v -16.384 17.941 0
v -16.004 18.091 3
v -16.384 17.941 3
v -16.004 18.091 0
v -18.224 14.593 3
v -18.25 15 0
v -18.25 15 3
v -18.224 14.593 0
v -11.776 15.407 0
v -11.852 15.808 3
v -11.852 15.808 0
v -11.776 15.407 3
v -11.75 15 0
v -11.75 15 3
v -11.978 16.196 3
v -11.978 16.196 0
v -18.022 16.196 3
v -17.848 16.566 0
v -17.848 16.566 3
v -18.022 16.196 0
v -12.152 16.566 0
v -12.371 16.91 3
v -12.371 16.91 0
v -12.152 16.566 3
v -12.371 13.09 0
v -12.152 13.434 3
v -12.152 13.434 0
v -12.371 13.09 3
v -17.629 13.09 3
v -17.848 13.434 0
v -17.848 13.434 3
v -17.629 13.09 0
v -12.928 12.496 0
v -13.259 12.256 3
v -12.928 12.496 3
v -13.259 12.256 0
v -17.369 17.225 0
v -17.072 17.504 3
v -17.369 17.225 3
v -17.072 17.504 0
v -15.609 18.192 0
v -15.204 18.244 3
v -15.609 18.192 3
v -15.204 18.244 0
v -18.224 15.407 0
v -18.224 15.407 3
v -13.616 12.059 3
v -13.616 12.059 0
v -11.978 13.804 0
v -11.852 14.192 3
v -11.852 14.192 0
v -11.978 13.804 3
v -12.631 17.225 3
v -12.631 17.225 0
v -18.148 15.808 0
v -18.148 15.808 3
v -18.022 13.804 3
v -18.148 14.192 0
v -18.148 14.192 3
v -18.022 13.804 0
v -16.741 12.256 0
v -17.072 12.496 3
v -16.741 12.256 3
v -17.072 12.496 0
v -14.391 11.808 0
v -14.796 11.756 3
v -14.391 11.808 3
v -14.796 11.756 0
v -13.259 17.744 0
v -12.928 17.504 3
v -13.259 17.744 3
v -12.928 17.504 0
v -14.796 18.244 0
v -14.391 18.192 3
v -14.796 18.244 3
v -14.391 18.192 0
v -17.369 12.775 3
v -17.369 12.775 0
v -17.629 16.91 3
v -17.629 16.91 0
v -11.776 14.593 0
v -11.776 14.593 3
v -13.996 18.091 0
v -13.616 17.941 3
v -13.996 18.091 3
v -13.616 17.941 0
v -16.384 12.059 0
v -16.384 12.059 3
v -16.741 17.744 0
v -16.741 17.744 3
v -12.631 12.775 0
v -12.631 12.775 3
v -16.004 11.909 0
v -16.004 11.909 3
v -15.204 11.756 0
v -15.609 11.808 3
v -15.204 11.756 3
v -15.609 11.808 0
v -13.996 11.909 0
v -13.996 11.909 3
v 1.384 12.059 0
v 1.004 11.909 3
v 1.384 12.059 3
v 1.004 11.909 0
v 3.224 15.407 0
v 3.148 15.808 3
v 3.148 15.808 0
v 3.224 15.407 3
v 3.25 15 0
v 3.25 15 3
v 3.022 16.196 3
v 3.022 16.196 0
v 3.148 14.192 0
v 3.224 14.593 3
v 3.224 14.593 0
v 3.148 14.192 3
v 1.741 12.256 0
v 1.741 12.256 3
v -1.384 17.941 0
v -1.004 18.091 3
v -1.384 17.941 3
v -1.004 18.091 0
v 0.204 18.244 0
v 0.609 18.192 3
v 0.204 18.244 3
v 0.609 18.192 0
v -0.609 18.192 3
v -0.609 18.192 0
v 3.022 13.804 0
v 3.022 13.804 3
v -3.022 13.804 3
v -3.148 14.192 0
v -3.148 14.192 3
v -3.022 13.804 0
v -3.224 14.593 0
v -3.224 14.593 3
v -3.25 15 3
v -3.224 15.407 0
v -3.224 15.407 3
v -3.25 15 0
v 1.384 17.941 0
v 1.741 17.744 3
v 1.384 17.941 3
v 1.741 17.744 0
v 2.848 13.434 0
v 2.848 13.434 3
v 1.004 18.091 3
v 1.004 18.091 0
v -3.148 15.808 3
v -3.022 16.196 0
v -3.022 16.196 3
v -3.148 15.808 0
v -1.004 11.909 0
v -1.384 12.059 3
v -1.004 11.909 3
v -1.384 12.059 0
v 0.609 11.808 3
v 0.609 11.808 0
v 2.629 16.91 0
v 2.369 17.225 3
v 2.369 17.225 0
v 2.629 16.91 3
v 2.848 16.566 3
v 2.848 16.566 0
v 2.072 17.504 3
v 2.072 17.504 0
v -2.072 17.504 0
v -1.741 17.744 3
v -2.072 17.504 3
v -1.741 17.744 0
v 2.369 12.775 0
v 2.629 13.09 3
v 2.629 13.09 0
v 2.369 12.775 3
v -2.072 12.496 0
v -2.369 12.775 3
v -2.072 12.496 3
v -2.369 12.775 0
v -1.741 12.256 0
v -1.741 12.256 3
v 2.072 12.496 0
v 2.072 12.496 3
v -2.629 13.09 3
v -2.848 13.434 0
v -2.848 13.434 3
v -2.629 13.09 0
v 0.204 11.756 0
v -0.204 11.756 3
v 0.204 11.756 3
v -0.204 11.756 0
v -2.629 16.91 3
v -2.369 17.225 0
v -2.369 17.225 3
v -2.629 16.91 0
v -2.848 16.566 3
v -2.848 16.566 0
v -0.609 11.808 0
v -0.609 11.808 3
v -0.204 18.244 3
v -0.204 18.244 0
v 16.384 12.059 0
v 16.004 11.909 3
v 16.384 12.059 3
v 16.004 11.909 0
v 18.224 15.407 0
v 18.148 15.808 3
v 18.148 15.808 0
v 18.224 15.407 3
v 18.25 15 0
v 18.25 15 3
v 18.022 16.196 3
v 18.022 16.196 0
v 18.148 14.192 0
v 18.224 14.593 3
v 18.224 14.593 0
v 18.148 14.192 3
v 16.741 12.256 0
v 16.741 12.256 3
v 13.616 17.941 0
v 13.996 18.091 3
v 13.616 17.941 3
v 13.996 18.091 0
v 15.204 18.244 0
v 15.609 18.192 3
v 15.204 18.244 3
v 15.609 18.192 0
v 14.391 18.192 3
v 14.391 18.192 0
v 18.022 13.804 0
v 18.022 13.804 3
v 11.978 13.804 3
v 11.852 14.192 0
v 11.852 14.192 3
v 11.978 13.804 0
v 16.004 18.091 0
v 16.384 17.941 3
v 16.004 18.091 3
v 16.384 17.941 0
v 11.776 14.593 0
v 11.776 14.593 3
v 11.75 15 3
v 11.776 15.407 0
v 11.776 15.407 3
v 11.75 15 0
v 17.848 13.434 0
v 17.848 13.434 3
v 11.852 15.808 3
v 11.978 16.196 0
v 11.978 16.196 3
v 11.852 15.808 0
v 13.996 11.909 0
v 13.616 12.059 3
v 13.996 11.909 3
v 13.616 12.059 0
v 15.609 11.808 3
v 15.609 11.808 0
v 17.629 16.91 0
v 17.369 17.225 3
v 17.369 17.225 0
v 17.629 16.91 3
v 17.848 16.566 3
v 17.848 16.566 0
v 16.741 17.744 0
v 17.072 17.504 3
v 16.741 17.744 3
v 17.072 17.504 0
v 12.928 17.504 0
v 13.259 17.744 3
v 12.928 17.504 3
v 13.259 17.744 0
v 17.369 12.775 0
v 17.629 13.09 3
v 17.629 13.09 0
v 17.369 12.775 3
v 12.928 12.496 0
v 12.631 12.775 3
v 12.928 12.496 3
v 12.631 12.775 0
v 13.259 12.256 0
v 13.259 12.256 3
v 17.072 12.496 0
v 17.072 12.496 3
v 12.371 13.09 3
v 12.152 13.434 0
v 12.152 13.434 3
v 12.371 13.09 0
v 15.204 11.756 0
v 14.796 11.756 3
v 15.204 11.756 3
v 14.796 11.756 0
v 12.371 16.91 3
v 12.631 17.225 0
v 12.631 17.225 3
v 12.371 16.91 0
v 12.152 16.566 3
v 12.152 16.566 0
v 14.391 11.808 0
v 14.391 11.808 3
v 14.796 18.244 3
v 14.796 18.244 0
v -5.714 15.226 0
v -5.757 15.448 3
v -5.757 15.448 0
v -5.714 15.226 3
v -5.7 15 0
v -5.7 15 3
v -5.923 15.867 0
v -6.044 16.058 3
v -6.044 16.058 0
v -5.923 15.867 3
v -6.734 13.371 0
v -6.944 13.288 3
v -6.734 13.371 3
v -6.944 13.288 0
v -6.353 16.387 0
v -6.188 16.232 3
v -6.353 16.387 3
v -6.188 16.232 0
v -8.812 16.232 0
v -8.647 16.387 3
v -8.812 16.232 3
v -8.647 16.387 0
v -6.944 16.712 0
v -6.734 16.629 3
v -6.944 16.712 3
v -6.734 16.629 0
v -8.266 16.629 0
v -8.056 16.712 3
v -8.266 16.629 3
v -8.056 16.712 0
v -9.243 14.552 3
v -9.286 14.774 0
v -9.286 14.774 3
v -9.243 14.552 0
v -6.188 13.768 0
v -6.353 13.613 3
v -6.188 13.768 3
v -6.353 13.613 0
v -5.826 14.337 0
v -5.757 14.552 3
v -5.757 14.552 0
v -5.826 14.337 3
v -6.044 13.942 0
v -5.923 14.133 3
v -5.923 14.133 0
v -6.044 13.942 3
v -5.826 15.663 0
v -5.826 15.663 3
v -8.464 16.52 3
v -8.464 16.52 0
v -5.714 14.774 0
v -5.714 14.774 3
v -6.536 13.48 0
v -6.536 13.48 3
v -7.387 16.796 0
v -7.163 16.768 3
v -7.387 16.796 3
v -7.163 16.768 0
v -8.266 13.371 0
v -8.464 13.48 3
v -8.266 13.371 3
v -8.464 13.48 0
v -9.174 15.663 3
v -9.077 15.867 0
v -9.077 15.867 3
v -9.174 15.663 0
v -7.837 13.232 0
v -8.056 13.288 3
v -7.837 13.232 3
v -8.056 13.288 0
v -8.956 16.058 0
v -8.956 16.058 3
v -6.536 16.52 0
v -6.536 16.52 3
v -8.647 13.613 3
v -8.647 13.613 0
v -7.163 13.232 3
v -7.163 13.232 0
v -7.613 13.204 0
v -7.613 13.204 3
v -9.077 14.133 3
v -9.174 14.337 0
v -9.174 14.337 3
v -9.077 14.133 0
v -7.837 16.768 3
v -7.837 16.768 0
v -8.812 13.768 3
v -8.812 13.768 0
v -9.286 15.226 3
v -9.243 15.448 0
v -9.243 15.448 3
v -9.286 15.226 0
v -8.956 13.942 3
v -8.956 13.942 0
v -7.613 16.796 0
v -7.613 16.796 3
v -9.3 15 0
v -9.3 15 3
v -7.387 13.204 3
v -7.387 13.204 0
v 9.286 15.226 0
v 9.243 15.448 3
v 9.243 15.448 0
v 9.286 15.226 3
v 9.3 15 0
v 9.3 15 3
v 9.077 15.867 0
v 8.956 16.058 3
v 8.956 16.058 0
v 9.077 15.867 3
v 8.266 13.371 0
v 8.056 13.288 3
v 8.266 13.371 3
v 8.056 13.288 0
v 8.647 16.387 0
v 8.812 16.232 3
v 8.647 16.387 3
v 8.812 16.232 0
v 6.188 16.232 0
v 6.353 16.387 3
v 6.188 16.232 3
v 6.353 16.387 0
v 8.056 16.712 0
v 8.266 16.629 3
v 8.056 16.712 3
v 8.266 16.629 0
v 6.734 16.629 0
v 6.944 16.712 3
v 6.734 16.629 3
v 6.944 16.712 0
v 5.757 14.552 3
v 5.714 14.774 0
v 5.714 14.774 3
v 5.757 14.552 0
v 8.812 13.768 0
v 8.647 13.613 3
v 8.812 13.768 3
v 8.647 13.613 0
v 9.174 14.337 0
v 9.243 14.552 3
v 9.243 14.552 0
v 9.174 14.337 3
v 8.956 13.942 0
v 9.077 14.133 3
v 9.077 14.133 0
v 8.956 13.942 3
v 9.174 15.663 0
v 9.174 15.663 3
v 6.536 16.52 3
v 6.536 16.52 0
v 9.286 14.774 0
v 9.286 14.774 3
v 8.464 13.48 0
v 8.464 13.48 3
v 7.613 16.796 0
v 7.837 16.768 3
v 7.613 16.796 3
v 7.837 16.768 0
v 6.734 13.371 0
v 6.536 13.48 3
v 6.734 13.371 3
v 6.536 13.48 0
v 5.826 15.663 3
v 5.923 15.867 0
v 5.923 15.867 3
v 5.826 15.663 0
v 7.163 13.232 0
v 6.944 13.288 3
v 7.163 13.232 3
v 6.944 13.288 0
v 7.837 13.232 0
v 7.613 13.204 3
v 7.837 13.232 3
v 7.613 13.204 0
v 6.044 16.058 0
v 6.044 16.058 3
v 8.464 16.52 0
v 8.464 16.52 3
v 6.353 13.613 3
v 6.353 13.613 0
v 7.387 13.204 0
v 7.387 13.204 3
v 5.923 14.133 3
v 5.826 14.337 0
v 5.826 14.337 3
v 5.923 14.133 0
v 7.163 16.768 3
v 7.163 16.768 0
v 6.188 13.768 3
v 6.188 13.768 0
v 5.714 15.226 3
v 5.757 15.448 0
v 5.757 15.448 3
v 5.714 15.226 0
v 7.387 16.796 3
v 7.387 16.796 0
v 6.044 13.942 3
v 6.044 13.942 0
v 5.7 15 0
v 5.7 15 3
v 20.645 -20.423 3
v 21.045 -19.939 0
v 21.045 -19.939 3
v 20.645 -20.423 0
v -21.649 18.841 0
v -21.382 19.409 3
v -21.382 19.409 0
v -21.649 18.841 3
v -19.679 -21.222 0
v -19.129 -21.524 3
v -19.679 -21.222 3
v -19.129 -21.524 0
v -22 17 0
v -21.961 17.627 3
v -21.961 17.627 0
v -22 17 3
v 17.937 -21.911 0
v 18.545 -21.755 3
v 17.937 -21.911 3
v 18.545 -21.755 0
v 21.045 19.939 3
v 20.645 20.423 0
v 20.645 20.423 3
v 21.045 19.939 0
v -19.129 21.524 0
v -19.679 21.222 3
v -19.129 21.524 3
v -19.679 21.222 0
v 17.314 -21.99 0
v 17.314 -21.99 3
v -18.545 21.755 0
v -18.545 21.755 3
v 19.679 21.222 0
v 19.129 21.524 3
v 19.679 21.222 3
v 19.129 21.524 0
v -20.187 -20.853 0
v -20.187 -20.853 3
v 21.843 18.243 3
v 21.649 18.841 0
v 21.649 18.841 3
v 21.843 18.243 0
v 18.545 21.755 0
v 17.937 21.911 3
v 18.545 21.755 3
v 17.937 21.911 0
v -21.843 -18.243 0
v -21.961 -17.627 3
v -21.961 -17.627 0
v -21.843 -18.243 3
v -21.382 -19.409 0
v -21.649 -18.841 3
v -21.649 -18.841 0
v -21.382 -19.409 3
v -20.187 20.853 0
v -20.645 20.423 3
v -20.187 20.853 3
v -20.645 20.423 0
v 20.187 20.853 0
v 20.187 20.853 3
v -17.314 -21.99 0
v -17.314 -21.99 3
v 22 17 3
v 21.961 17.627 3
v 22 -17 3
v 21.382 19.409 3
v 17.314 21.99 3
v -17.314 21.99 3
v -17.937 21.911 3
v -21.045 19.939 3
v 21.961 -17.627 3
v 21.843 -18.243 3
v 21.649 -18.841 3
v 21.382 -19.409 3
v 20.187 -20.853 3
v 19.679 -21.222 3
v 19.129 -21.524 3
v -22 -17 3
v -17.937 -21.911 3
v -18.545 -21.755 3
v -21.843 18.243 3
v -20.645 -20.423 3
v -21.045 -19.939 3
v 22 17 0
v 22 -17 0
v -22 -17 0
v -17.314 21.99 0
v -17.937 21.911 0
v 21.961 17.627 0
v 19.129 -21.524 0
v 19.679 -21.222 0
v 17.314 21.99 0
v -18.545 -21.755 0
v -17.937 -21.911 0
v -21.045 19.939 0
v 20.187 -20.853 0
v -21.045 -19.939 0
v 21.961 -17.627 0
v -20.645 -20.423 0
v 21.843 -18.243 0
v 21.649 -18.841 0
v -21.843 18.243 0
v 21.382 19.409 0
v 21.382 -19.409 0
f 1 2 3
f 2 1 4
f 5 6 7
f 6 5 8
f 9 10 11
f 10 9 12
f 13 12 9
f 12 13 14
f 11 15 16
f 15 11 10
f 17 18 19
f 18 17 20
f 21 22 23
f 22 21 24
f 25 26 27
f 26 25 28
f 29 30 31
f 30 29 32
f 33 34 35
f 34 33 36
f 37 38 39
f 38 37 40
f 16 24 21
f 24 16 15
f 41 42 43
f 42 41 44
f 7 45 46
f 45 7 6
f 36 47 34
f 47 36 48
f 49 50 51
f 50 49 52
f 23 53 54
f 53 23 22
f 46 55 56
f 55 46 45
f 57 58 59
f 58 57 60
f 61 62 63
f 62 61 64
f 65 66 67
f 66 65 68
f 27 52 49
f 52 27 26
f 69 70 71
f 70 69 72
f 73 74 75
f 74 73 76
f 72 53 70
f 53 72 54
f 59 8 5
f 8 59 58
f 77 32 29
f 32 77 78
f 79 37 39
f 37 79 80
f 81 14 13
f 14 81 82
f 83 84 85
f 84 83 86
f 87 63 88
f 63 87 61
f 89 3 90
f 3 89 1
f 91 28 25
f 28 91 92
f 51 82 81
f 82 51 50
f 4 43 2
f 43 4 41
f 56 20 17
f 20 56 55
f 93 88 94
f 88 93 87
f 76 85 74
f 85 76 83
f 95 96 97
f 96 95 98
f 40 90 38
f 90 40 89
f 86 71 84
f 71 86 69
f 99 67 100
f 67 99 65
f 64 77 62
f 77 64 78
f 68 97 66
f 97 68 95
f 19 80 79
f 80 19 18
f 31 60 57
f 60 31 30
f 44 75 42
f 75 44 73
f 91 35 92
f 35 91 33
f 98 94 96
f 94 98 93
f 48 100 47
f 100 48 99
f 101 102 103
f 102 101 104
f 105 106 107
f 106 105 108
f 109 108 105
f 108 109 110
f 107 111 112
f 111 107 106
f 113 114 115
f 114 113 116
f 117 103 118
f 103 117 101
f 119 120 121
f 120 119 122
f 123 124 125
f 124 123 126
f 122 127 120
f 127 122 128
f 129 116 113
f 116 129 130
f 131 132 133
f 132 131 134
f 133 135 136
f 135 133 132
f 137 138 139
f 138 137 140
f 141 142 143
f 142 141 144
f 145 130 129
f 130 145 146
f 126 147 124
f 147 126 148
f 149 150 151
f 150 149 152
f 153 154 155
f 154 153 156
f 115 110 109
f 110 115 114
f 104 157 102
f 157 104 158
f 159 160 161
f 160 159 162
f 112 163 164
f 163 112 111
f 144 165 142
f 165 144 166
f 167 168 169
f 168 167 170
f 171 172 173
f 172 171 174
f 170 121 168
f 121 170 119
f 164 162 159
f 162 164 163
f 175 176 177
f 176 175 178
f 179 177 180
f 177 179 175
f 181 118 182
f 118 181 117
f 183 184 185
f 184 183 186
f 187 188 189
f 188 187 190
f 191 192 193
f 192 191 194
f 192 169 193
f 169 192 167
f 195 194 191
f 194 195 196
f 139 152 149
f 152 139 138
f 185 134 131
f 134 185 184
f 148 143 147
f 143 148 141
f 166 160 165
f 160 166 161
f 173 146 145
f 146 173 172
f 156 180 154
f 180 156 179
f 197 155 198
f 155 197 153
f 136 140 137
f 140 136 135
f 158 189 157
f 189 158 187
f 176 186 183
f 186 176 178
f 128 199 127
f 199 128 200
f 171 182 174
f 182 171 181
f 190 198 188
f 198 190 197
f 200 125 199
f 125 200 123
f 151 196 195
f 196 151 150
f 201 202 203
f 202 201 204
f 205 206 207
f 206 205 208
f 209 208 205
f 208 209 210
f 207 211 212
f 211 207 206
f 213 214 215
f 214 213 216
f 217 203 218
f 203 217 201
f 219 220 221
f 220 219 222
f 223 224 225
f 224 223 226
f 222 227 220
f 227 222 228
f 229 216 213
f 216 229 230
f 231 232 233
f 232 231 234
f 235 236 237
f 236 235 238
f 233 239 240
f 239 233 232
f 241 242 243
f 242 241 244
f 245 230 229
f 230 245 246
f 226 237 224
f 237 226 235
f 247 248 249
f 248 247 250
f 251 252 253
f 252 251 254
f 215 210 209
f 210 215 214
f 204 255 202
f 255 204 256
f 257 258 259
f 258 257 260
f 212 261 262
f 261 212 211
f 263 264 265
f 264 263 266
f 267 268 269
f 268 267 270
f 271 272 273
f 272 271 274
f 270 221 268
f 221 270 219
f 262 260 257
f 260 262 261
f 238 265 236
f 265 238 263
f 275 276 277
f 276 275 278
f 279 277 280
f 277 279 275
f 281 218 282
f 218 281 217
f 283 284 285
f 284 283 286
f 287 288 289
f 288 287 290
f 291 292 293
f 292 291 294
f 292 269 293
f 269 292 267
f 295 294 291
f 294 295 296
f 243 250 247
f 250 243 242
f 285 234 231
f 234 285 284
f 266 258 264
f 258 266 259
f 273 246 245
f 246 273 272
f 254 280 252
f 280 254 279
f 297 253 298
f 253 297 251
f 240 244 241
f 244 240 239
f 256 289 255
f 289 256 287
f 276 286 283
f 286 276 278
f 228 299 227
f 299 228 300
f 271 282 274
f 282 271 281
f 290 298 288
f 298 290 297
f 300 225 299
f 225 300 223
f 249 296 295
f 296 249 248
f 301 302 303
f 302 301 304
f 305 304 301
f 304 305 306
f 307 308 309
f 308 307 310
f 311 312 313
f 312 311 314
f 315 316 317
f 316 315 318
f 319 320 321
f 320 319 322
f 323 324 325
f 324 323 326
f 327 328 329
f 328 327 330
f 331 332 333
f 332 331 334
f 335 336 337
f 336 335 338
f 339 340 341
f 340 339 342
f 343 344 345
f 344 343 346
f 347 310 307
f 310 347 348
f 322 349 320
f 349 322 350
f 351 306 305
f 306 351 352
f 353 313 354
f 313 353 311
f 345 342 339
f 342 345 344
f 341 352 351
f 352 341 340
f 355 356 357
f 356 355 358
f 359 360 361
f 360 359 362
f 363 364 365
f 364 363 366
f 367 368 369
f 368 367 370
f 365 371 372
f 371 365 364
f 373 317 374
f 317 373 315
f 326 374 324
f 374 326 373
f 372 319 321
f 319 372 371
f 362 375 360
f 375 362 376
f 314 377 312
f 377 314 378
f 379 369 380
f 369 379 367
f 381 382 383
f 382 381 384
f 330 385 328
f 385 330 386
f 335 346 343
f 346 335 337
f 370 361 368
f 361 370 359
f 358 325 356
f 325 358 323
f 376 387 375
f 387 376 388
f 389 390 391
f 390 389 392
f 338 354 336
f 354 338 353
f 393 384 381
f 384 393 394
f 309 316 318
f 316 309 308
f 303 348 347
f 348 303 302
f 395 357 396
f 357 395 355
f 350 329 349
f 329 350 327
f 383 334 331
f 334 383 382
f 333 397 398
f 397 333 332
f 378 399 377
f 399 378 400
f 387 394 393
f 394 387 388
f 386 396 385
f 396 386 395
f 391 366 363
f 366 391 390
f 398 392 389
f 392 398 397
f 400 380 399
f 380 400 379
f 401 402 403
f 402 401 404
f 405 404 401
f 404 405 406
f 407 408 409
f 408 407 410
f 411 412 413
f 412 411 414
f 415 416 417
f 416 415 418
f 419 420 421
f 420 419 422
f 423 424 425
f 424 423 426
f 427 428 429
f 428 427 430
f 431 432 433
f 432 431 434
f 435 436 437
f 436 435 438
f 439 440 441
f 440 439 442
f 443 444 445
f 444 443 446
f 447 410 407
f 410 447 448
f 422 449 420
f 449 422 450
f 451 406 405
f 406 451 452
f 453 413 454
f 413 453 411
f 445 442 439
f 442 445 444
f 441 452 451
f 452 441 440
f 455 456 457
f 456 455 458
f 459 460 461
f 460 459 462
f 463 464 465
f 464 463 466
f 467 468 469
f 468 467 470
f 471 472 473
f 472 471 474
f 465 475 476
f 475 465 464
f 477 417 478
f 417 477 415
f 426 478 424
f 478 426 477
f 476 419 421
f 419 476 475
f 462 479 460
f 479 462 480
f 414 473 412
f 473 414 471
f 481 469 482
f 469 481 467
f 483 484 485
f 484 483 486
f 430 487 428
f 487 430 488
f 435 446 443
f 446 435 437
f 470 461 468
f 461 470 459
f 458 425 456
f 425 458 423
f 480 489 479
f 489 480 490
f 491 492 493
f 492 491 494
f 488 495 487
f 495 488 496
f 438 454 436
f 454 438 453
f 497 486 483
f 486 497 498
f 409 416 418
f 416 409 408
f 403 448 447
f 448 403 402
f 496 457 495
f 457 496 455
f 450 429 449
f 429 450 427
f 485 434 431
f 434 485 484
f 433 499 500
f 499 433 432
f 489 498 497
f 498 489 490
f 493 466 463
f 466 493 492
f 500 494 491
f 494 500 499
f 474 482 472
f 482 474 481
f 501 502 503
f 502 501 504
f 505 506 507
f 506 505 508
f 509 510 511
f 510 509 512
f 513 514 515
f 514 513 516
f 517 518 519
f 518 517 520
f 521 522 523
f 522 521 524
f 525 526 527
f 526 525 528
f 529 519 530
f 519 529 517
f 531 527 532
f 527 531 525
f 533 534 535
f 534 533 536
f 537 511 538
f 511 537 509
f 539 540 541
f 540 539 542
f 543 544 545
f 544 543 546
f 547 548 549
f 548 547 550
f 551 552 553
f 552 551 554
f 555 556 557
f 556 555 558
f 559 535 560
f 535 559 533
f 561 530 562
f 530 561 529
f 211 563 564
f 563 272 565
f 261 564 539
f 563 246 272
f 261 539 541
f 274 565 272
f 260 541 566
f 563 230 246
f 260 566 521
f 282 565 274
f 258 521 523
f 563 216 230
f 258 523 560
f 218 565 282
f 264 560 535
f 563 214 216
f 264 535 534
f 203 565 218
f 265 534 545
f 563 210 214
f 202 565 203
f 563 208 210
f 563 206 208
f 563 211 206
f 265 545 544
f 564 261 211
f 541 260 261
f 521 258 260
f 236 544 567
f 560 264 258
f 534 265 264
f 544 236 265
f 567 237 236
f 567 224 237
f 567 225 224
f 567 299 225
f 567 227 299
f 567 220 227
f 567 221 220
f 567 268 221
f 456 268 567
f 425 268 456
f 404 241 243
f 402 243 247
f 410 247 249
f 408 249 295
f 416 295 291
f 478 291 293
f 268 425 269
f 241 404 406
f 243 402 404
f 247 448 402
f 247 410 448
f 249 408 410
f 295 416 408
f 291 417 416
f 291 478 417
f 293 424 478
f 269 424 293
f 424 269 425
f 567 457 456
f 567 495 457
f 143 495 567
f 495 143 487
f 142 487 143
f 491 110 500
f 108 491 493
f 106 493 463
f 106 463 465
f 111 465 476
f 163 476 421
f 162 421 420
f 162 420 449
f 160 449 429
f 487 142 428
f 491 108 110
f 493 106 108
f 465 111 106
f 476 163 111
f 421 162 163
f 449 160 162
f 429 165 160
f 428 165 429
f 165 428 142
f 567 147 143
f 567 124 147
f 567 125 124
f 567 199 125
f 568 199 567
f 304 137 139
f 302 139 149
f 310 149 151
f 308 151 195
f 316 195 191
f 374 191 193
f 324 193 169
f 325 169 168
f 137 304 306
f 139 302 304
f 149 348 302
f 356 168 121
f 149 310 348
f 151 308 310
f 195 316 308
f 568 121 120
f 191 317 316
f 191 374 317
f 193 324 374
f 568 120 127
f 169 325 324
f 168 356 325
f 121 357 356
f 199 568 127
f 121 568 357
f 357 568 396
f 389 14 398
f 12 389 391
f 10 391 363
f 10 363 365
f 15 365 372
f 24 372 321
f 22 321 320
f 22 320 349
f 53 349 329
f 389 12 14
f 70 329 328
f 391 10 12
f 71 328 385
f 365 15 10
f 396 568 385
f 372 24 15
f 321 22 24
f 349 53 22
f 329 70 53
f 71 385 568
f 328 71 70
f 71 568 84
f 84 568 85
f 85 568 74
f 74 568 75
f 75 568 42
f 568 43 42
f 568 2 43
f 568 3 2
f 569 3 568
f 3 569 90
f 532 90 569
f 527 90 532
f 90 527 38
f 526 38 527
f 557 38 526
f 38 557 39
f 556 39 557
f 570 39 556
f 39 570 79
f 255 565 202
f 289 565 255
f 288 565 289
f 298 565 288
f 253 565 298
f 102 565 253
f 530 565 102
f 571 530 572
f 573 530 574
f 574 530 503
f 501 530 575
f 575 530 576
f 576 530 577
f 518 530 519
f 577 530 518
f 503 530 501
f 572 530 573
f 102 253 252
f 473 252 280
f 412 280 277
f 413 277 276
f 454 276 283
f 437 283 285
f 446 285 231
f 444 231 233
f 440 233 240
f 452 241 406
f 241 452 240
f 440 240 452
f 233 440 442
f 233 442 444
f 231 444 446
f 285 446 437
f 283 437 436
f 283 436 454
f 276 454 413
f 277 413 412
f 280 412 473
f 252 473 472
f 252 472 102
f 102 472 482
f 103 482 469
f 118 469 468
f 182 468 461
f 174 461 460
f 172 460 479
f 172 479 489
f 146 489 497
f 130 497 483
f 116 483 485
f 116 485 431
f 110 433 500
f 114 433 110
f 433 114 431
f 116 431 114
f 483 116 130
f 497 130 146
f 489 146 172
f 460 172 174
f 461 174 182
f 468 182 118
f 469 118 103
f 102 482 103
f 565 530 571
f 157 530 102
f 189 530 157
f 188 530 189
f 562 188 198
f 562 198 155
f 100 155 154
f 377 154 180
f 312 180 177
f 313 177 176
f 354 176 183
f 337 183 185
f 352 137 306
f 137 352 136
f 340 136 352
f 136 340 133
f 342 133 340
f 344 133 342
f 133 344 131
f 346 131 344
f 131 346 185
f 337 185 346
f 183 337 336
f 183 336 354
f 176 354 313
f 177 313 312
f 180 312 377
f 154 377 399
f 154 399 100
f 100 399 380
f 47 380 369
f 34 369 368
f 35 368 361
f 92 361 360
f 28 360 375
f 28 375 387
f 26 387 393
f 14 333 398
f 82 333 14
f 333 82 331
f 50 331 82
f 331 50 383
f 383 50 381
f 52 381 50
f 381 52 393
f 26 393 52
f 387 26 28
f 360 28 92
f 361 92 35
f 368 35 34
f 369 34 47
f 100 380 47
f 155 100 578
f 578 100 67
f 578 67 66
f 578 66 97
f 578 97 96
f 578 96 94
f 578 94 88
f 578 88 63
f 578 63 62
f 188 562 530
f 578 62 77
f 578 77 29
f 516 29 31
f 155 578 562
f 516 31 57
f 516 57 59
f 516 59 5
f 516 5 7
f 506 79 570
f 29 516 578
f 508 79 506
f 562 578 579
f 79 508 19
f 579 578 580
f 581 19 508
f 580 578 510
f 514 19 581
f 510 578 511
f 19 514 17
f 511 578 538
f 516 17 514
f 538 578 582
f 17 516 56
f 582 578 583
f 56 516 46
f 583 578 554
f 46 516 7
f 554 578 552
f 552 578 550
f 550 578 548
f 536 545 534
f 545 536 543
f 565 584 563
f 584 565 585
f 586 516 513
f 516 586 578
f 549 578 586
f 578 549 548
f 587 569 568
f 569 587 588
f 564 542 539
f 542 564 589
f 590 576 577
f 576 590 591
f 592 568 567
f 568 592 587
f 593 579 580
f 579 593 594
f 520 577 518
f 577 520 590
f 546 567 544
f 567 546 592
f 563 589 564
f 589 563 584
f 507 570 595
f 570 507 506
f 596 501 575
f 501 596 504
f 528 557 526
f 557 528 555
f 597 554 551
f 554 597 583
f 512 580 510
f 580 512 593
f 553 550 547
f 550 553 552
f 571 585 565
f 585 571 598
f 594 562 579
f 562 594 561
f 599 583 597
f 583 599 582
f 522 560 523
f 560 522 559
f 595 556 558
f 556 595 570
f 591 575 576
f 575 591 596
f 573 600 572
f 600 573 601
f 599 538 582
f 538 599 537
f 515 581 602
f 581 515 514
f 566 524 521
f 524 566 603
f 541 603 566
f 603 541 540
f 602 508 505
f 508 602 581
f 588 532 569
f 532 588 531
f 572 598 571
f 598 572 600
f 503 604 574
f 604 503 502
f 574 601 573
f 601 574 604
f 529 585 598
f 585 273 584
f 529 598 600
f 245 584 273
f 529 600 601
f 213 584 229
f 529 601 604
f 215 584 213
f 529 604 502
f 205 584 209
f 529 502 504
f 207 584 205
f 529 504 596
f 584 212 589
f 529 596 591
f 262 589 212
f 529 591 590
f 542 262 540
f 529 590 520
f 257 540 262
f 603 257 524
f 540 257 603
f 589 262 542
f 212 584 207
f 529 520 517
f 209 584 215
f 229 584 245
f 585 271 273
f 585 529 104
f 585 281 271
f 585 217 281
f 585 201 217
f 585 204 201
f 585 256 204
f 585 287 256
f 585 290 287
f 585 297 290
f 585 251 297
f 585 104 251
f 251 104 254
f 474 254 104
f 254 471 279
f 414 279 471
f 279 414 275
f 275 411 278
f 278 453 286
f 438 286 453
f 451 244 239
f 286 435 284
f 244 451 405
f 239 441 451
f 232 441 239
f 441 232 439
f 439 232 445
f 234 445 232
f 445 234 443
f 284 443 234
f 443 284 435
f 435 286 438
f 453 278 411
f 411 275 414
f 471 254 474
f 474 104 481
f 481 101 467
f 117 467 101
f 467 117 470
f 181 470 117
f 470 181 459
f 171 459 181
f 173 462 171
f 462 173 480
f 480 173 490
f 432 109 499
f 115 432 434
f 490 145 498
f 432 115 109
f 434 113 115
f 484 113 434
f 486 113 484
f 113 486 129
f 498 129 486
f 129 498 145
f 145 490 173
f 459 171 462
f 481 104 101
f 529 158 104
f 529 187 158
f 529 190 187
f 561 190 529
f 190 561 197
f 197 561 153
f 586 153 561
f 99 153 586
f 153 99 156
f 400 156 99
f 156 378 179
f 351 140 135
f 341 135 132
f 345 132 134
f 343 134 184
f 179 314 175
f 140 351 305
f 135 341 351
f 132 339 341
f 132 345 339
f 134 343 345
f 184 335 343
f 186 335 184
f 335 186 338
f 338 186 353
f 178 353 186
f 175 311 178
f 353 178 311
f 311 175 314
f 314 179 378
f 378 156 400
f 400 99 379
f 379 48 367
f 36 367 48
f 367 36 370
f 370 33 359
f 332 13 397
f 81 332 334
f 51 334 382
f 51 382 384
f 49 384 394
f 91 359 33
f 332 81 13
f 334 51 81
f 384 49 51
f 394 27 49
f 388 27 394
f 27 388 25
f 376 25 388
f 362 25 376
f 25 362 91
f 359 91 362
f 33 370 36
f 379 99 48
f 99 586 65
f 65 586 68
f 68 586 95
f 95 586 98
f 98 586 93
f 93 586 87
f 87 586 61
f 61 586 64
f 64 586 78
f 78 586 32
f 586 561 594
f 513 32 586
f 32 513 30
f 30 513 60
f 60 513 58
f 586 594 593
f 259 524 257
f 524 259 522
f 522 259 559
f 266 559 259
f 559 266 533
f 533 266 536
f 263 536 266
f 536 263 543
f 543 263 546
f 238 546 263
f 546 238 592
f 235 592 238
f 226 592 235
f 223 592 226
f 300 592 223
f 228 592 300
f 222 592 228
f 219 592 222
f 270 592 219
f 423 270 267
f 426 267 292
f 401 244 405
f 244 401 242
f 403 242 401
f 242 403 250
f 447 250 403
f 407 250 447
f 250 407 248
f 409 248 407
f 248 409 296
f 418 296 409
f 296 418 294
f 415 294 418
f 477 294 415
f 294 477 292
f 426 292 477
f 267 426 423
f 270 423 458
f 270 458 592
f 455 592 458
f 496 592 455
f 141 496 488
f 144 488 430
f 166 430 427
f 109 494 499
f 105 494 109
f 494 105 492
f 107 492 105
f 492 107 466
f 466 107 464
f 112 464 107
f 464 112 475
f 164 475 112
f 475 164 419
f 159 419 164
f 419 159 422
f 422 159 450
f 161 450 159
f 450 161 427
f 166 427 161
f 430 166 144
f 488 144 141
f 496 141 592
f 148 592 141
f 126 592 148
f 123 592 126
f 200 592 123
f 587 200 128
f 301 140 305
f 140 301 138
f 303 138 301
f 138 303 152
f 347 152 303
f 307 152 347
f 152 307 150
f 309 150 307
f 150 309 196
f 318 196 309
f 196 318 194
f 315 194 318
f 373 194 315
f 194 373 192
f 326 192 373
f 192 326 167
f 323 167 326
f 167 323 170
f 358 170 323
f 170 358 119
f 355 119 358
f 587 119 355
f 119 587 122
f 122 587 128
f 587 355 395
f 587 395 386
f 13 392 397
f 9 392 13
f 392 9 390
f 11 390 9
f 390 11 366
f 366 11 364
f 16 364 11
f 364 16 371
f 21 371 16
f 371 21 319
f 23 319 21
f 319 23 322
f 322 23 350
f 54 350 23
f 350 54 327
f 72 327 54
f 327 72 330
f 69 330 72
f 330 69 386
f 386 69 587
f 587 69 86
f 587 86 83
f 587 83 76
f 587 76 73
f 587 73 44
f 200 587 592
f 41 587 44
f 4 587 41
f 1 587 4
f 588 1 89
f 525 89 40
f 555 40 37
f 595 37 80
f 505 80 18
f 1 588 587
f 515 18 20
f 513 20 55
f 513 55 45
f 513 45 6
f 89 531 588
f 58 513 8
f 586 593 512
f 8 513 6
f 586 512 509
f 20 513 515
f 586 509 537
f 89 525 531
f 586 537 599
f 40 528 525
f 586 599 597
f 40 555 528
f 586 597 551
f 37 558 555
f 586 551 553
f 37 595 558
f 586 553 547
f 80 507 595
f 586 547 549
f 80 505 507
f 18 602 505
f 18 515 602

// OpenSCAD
$fn = 50;


difference() {
	union() {
		*color(alpha = 1.0000000000, c = "gray") {
			translate(v = [0, 7, 0]) {
				linear_extrude(height = 1) {
					text(font = "Arial:style=Bold", halign = "center", size = 4.5000000000, text = "COMMENT plate main", valign = "center");
				}
			}
		}
		hull() {
			translate(v = [-17.0000000000, 17.0000000000, 0]) {
				cylinder(h = 3, r = 5);
			}
			translate(v = [17.0000000000, 17.0000000000, 0]) {
				cylinder(h = 3, r = 5);
			}
			translate(v = [-17.0000000000, -17.0000000000, 0]) {
				cylinder(h = 3, r = 5);
			}
			translate(v = [17.0000000000, -17.0000000000, 0]) {
				cylinder(h = 3, r = 5);
			}
		}
	}
	union() {
		*color(alpha = 1.0000000000, c = "gray") {
			translate(v = [0, 7, 0]) {
				linear_extrude(height = 1) {
					text(font = "Arial:style=Bold", halign = "center", size = 4.5000000000, text = "COMMENT holes main", valign = "center");
				}
			}
		}
		translate(v = [-15.0000000000, 15.0000000000, -100.0000000000]) {
			cylinder(h = 200, r = 3.2500000000);
		}
		translate(v = [0.0000000000, 15.0000000000, -100.0000000000]) {
			cylinder(h = 200, r = 3.2500000000);
		}
		translate(v = [15.0000000000, 15.0000000000, -100.0000000000]) {
			cylinder(h = 200, r = 3.2500000000);
		}
		translate(v = [-15.0000000000, 15.0000000000, -100.0000000000]) {
			cylinder(h = 200, r = 1.8000000000);
		}
		translate(v = [-7.5000000000, 15.0000000000, -100.0000000000]) {
			cylinder(h = 200, r = 1.8000000000);
		}
		translate(v = [0.0000000000, 15.0000000000, -100.0000000000]) {
			cylinder(h = 200, r = 1.8000000000);
		}
		translate(v = [7.5000000000, 15.0000000000, -100.0000000000]) {
			cylinder(h = 200, r = 1.8000000000);
		}
		translate(v = [15.0000000000, 15.0000000000, -100.0000000000]) {
			cylinder(h = 200, r = 1.8000000000);
		}
		translate(v = [-15.0000000000, 15.0000000000, -100.0000000000]) {
			cylinder(h = 200, r = 1.8000000000);
		}
		translate(v = [-7.5000000000, 15.0000000000, -100.0000000000]) {
			cylinder(h = 200, r = 1.8000000000);
		}
		translate(v = [0.0000000000, 15.0000000000, -100.0000000000]) {
			cylinder(h = 200, r = 1.8000000000);
		}
		translate(v = [7.5000000000, 15.0000000000, -100.0000000000]) {
			cylinder(h = 200, r = 1.8000000000);
		}
		translate(v = [15.0000000000, 15.0000000000, -100.0000000000]) {
			cylinder(h = 200, r = 1.8000000000);
		}
		translate(v = [-15.0000000000, 15.0000000000, -100.0000000000]) {
			cylinder(h = 200, r = 1.8000000000);
		}
		translate(v = [-7.5000000000, 15.0000000000, -100.0000000000]) {
			cylinder(h = 200, r = 1.8000000000);
		}
		translate(v = [0.0000000000, 15.0000000000, -100.0000000000]) {
			cylinder(h = 200, r = 1.8000000000);
		}
		translate(v = [7.5000000000, 15.0000000000, -100.0000000000]) {
			cylinder(h = 200, r = 1.8000000000);
		}
		translate(v = [15.0000000000, 15.0000000000, -100.0000000000]) {
			cylinder(h = 200, r = 1.8000000000);
		}
	}
}
